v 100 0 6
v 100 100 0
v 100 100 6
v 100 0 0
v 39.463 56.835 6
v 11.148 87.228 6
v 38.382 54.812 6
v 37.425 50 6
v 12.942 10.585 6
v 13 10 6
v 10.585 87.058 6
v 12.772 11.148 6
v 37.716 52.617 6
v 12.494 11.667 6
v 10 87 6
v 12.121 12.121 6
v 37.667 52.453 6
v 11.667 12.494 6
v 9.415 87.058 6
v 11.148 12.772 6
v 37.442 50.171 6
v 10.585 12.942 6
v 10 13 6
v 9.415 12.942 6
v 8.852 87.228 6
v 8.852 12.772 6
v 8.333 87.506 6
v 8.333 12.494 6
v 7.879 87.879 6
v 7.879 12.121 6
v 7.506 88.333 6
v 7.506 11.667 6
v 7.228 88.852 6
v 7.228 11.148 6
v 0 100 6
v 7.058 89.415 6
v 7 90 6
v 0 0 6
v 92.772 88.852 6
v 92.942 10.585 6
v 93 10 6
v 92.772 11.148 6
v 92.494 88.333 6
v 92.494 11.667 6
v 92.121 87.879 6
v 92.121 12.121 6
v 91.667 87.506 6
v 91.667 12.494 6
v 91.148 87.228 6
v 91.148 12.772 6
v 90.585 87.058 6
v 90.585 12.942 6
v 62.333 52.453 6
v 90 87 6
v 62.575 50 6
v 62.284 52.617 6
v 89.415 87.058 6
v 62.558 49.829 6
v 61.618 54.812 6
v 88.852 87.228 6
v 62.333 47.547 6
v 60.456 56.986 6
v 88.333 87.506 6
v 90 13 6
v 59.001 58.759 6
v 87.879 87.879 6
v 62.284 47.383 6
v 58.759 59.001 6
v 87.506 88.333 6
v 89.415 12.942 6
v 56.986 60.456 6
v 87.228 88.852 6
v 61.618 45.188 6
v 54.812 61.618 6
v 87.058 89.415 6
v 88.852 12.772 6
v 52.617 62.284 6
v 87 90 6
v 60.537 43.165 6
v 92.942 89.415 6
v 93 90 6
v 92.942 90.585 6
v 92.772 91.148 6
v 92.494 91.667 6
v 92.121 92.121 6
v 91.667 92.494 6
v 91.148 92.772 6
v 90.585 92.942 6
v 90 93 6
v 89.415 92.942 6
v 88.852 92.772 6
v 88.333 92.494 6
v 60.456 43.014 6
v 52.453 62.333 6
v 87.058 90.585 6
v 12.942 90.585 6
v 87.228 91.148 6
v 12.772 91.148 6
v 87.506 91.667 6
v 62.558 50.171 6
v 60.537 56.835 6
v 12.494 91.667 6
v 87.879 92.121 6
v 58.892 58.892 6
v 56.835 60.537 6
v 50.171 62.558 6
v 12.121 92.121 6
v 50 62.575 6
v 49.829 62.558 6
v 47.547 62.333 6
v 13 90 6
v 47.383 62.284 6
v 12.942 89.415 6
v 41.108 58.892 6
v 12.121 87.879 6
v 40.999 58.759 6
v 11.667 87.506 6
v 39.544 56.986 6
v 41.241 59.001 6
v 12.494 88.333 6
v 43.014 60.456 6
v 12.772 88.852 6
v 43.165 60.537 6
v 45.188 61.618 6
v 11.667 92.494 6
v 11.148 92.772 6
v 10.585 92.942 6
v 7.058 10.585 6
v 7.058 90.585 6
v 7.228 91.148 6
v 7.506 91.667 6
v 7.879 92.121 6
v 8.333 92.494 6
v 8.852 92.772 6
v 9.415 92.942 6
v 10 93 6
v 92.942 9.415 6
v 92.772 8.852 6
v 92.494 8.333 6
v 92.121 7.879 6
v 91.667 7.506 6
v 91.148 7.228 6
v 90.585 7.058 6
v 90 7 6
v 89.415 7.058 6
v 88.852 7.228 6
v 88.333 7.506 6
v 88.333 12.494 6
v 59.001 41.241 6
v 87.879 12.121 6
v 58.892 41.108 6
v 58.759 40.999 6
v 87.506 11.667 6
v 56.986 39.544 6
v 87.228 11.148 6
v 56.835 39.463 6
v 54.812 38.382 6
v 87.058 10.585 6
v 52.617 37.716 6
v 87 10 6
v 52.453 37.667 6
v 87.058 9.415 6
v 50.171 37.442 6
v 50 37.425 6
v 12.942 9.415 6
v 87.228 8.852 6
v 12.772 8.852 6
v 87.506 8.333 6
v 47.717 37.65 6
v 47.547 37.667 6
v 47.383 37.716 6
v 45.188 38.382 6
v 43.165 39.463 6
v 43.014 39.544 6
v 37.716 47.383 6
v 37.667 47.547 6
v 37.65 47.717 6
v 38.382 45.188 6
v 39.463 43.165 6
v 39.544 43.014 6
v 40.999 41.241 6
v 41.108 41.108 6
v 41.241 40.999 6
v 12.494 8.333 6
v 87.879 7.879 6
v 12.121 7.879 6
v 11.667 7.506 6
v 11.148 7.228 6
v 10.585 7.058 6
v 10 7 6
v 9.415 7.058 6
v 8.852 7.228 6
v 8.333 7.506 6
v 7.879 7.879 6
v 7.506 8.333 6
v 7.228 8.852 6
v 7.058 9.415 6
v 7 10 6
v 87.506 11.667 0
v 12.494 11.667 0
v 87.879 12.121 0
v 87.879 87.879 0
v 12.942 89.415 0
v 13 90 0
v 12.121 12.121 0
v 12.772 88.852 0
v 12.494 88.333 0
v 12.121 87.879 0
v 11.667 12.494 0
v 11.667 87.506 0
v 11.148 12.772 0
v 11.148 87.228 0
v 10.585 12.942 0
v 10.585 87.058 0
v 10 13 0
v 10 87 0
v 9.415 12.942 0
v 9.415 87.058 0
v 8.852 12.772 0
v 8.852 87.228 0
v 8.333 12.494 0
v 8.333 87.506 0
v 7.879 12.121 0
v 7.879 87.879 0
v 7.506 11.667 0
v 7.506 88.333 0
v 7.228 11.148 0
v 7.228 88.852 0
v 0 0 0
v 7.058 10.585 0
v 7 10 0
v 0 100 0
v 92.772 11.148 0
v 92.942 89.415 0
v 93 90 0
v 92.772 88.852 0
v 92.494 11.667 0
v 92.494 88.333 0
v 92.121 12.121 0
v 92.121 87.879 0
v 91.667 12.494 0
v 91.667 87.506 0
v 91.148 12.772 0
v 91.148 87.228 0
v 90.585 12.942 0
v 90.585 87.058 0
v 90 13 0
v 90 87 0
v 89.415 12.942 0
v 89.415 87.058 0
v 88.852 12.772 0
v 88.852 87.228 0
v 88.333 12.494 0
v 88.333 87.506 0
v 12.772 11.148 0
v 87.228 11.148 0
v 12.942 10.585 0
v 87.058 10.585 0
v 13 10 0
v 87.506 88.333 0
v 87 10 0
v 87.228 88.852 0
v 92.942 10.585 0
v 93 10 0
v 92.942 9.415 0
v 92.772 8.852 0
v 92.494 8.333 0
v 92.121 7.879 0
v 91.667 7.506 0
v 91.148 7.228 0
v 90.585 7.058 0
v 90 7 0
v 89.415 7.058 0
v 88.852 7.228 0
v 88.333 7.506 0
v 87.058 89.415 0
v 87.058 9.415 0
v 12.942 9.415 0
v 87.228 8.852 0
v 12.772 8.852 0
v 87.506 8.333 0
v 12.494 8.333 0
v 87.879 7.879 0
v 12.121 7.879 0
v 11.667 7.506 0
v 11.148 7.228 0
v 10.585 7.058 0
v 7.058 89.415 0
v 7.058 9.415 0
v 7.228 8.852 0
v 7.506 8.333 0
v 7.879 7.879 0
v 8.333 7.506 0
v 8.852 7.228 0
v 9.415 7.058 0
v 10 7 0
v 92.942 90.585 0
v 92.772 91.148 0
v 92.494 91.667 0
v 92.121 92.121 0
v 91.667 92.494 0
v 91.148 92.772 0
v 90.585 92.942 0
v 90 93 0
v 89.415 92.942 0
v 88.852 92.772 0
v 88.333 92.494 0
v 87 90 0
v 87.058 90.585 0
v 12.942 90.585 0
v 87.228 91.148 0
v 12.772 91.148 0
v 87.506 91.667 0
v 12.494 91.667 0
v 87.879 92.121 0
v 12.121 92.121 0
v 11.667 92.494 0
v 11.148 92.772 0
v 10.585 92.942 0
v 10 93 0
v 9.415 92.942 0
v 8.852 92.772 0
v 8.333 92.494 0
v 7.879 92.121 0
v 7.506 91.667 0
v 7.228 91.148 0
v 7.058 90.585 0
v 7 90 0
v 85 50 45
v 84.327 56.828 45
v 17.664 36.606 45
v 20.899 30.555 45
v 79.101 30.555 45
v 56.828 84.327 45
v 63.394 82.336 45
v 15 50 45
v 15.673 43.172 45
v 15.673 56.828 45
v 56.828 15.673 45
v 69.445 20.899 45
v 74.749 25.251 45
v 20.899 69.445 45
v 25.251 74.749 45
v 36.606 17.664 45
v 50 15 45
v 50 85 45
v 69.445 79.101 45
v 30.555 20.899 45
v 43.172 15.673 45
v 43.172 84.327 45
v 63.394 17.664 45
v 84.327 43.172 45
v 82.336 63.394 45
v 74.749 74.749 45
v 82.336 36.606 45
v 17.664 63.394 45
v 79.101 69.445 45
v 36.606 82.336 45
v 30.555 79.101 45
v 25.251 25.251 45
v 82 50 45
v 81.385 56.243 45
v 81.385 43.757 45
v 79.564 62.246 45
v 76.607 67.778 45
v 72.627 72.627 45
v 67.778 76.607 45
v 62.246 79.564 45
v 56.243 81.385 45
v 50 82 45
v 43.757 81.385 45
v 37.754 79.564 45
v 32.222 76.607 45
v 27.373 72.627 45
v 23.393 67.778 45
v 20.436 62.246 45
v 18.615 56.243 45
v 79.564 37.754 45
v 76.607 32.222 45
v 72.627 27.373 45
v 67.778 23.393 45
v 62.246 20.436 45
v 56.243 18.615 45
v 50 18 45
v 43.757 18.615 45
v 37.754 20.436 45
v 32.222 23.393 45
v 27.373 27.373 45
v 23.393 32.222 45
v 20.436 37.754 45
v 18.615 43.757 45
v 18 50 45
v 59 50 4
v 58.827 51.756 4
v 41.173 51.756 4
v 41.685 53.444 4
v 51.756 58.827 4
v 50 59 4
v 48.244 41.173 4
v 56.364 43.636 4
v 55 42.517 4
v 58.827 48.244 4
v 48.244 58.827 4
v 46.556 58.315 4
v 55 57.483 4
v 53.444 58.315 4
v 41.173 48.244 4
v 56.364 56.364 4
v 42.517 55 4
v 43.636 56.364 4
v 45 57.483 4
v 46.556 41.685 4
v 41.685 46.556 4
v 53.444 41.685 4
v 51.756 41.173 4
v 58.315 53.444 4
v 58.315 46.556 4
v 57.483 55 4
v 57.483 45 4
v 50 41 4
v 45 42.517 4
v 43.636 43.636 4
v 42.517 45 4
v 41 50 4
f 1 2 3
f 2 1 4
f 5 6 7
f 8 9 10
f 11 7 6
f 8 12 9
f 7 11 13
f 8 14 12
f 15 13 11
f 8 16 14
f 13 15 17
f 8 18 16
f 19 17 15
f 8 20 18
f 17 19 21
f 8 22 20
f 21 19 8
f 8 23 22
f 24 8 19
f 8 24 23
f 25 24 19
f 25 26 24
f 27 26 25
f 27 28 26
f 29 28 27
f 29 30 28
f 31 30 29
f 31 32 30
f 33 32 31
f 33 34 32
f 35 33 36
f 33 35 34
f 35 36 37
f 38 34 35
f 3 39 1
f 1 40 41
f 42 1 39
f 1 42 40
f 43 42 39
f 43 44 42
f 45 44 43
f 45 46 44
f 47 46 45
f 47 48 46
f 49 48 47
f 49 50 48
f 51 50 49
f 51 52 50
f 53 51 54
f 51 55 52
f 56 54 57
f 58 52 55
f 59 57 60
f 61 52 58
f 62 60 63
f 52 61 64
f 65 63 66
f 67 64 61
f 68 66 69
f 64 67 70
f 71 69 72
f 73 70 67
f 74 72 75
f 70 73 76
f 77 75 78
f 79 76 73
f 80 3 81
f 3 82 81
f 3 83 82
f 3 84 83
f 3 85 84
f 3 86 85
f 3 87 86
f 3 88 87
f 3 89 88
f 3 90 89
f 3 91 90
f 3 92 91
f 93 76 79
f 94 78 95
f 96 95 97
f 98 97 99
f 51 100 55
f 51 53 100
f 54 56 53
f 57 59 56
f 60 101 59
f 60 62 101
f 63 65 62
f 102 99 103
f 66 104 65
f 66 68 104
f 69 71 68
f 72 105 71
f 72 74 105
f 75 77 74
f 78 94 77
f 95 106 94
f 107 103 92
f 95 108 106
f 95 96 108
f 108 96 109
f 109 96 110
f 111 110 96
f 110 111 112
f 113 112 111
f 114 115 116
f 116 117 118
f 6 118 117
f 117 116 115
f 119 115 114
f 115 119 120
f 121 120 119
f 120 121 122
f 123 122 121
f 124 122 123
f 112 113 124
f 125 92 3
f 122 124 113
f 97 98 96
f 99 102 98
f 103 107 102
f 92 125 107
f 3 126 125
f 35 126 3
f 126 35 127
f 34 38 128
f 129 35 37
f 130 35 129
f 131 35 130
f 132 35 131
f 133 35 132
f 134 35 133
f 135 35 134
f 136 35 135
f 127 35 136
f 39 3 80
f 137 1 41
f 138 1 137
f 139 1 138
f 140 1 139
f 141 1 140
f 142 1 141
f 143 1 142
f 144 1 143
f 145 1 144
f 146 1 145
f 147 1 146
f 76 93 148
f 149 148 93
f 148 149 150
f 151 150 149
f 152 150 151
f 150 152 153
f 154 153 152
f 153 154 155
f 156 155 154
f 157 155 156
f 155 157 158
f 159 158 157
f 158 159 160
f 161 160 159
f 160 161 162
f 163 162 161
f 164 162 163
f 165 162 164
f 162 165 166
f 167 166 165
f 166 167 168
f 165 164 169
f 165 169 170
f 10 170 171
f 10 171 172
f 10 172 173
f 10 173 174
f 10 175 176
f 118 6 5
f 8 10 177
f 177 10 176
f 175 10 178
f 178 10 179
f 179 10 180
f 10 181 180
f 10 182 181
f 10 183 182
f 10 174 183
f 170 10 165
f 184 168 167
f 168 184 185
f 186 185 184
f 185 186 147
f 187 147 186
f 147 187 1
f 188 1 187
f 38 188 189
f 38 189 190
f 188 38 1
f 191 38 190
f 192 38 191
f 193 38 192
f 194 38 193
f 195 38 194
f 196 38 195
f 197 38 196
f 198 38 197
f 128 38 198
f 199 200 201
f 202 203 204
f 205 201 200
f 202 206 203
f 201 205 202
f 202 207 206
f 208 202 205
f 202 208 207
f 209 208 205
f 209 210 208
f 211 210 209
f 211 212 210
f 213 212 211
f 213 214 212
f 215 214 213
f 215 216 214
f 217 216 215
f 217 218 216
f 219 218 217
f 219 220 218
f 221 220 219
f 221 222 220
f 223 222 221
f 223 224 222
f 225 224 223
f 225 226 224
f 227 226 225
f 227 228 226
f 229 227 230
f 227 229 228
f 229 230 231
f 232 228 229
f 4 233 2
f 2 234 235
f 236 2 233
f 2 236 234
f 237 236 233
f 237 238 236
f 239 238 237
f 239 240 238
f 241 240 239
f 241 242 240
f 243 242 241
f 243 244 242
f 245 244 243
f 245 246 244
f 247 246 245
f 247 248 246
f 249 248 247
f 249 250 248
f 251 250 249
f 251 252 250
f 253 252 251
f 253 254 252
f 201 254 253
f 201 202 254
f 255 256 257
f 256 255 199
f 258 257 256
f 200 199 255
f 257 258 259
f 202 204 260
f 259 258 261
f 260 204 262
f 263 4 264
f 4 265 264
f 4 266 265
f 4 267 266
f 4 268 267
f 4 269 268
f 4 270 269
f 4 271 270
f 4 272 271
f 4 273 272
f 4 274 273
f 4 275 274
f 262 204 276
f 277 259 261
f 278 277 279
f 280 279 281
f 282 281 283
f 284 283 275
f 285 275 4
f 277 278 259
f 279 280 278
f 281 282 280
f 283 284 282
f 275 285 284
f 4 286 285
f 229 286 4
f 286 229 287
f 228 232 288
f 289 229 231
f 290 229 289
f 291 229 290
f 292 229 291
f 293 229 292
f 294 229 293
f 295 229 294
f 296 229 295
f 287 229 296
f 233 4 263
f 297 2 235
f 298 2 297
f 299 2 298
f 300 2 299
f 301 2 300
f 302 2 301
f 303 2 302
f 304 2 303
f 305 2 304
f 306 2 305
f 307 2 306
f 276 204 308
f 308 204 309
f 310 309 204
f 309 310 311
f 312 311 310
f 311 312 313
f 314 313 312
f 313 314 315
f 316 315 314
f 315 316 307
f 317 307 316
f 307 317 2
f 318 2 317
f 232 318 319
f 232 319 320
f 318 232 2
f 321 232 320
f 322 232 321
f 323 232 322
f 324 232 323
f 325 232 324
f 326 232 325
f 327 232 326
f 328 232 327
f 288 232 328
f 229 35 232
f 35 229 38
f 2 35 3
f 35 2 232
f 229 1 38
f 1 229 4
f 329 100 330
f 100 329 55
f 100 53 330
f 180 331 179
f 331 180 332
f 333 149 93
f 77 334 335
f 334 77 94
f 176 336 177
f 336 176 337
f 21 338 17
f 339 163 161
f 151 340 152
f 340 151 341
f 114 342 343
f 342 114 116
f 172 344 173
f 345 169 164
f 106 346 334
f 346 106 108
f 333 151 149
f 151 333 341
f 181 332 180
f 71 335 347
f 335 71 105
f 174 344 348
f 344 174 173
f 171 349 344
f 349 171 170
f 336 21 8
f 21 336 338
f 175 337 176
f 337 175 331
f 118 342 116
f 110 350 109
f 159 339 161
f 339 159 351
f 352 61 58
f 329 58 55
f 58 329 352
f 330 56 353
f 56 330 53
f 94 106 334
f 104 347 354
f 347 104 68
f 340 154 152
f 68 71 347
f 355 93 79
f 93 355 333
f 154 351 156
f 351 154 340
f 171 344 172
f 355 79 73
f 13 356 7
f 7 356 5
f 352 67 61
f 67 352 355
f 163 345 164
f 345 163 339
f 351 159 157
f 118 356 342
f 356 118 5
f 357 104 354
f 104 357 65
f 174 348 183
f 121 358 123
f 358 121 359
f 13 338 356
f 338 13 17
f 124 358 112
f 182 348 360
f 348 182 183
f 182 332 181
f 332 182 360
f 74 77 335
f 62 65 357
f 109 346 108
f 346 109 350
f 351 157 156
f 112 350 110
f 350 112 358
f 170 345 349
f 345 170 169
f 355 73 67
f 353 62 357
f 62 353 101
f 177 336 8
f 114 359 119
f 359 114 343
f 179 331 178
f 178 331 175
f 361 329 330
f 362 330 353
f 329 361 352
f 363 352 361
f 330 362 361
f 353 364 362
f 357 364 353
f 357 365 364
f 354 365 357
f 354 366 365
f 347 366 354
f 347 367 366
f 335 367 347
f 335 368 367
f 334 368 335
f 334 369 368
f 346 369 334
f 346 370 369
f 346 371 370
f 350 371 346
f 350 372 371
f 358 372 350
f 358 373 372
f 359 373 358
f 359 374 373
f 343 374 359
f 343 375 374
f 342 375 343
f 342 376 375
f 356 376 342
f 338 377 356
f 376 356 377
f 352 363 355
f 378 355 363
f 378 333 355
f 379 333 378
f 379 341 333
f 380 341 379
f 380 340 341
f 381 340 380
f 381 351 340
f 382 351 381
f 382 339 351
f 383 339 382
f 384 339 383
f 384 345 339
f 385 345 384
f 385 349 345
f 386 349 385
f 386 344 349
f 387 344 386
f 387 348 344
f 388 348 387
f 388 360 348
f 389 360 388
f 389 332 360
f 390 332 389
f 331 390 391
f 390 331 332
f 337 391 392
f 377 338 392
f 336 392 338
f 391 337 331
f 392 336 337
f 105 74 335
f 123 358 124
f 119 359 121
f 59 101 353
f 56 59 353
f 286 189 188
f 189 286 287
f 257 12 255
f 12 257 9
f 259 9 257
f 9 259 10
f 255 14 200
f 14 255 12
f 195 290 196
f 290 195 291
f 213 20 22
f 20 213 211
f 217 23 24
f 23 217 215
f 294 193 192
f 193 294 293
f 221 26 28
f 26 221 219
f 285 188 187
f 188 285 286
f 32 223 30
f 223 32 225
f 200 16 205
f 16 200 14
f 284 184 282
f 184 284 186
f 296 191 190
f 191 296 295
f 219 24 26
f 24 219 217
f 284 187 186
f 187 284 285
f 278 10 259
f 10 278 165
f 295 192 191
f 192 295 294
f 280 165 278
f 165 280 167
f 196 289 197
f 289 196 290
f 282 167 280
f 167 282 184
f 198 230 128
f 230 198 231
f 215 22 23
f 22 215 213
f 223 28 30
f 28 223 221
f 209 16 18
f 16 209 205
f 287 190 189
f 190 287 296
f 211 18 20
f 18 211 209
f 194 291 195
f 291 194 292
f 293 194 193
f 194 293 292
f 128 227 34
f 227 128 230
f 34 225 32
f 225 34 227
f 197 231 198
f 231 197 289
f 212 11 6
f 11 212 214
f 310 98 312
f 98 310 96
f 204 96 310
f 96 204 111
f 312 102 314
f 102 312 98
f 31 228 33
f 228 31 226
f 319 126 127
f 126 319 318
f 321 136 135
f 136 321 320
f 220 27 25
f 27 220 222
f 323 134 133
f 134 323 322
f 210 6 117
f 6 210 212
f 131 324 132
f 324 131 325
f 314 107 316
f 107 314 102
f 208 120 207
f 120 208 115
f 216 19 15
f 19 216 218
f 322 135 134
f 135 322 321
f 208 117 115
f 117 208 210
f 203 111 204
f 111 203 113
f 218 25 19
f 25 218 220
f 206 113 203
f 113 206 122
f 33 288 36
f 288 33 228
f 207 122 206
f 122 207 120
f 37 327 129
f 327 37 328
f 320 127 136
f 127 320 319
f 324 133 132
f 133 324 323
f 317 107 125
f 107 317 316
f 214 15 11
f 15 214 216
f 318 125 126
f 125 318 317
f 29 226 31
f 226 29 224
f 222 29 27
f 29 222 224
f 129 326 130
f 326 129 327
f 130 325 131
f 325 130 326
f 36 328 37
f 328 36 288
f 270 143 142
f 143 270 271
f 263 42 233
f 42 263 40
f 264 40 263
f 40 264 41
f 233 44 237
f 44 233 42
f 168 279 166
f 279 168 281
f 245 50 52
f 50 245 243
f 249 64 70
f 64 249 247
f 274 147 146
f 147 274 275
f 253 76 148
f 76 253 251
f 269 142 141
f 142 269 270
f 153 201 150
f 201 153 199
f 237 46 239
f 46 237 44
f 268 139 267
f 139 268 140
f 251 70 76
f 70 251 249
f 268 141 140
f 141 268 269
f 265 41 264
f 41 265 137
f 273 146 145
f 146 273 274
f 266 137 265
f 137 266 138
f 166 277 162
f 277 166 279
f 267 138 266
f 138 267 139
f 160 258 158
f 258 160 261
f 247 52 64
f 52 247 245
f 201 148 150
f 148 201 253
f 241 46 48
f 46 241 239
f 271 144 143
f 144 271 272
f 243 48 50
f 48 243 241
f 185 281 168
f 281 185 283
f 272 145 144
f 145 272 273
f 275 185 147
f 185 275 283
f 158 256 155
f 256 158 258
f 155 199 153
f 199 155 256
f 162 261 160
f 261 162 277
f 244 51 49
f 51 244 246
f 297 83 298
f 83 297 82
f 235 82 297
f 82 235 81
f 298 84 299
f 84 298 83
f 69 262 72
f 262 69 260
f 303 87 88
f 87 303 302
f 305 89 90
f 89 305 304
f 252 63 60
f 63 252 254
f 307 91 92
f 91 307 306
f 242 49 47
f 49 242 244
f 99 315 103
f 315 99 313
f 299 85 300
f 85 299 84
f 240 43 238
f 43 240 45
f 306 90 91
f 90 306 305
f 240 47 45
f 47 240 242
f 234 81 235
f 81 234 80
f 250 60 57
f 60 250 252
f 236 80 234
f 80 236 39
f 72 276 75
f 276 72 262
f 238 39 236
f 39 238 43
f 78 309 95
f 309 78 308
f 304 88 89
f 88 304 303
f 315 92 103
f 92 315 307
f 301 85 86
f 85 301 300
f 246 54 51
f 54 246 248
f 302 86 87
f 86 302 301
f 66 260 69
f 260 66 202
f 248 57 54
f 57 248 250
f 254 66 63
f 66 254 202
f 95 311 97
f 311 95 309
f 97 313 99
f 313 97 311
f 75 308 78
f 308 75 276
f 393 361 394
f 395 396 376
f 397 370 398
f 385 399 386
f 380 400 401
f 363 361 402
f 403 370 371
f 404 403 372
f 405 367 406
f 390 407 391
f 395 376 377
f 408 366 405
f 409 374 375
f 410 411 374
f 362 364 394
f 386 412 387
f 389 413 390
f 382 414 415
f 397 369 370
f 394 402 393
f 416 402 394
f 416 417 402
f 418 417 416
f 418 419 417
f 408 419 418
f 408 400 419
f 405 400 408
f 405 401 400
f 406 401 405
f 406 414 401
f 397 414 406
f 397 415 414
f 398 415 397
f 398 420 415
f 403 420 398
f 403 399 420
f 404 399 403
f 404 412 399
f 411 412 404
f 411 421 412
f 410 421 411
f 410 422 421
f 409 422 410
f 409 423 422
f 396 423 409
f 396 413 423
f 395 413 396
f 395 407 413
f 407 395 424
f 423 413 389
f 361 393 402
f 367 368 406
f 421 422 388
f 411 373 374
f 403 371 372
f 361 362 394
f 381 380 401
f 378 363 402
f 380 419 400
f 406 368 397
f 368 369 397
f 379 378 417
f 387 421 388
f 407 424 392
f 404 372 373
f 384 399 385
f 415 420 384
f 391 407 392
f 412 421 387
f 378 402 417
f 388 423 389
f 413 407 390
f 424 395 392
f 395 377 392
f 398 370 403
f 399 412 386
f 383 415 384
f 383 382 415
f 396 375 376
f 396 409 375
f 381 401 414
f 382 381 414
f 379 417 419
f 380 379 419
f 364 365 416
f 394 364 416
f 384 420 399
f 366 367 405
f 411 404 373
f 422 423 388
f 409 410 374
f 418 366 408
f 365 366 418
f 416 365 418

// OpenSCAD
$fn = 32;

// ----------------------------------------------------------------------
// Hopper: flanged with square flange
// ----------------------------------------------------------------------

// --- parameters (mm) ---
fl = 100;                 // flange side, X and Y
fl_t = 6;                 // flange thickness
cone_h = 40;              // cone height above the flange
top_d = 70;               // cone mouth diameter
bot_d = 24;               // cone spout diameter
wall = 3;                 // cone wall thickness
hole_r = 3;               // flange hole radius
hole_in = 10;             // hole inset from the corners
fit_tol = 0.05;           // tolerance for press fits, mm
free_tol = 0.3;           // tolerance for clearance fits, mm

bore_d = bot_d - 2 * wall;  // spout bore diameter
total_h = fl_t + cone_h - 1;  // overall height

difference() {
  union() {
    cube([fl, fl, fl_t]);
    translate([fl / 2, fl / 2, fl_t - 1])
      cylinder(h = cone_h, d1 = bot_d, d2 = top_d);
  }
  translate([fl / 2, fl / 2, fl_t - 2])
    cylinder(h = cone_h + 1, d1 = bore_d, d2 = top_d - 2 * wall);
  for (sx = [0, 1], sy = [0, 1])
    translate([sx ? fl - hole_in : hole_in,
               sy ? fl - hole_in : hole_in, -1])
      cylinder(r = hole_r, h = fl_t + 2);
}
